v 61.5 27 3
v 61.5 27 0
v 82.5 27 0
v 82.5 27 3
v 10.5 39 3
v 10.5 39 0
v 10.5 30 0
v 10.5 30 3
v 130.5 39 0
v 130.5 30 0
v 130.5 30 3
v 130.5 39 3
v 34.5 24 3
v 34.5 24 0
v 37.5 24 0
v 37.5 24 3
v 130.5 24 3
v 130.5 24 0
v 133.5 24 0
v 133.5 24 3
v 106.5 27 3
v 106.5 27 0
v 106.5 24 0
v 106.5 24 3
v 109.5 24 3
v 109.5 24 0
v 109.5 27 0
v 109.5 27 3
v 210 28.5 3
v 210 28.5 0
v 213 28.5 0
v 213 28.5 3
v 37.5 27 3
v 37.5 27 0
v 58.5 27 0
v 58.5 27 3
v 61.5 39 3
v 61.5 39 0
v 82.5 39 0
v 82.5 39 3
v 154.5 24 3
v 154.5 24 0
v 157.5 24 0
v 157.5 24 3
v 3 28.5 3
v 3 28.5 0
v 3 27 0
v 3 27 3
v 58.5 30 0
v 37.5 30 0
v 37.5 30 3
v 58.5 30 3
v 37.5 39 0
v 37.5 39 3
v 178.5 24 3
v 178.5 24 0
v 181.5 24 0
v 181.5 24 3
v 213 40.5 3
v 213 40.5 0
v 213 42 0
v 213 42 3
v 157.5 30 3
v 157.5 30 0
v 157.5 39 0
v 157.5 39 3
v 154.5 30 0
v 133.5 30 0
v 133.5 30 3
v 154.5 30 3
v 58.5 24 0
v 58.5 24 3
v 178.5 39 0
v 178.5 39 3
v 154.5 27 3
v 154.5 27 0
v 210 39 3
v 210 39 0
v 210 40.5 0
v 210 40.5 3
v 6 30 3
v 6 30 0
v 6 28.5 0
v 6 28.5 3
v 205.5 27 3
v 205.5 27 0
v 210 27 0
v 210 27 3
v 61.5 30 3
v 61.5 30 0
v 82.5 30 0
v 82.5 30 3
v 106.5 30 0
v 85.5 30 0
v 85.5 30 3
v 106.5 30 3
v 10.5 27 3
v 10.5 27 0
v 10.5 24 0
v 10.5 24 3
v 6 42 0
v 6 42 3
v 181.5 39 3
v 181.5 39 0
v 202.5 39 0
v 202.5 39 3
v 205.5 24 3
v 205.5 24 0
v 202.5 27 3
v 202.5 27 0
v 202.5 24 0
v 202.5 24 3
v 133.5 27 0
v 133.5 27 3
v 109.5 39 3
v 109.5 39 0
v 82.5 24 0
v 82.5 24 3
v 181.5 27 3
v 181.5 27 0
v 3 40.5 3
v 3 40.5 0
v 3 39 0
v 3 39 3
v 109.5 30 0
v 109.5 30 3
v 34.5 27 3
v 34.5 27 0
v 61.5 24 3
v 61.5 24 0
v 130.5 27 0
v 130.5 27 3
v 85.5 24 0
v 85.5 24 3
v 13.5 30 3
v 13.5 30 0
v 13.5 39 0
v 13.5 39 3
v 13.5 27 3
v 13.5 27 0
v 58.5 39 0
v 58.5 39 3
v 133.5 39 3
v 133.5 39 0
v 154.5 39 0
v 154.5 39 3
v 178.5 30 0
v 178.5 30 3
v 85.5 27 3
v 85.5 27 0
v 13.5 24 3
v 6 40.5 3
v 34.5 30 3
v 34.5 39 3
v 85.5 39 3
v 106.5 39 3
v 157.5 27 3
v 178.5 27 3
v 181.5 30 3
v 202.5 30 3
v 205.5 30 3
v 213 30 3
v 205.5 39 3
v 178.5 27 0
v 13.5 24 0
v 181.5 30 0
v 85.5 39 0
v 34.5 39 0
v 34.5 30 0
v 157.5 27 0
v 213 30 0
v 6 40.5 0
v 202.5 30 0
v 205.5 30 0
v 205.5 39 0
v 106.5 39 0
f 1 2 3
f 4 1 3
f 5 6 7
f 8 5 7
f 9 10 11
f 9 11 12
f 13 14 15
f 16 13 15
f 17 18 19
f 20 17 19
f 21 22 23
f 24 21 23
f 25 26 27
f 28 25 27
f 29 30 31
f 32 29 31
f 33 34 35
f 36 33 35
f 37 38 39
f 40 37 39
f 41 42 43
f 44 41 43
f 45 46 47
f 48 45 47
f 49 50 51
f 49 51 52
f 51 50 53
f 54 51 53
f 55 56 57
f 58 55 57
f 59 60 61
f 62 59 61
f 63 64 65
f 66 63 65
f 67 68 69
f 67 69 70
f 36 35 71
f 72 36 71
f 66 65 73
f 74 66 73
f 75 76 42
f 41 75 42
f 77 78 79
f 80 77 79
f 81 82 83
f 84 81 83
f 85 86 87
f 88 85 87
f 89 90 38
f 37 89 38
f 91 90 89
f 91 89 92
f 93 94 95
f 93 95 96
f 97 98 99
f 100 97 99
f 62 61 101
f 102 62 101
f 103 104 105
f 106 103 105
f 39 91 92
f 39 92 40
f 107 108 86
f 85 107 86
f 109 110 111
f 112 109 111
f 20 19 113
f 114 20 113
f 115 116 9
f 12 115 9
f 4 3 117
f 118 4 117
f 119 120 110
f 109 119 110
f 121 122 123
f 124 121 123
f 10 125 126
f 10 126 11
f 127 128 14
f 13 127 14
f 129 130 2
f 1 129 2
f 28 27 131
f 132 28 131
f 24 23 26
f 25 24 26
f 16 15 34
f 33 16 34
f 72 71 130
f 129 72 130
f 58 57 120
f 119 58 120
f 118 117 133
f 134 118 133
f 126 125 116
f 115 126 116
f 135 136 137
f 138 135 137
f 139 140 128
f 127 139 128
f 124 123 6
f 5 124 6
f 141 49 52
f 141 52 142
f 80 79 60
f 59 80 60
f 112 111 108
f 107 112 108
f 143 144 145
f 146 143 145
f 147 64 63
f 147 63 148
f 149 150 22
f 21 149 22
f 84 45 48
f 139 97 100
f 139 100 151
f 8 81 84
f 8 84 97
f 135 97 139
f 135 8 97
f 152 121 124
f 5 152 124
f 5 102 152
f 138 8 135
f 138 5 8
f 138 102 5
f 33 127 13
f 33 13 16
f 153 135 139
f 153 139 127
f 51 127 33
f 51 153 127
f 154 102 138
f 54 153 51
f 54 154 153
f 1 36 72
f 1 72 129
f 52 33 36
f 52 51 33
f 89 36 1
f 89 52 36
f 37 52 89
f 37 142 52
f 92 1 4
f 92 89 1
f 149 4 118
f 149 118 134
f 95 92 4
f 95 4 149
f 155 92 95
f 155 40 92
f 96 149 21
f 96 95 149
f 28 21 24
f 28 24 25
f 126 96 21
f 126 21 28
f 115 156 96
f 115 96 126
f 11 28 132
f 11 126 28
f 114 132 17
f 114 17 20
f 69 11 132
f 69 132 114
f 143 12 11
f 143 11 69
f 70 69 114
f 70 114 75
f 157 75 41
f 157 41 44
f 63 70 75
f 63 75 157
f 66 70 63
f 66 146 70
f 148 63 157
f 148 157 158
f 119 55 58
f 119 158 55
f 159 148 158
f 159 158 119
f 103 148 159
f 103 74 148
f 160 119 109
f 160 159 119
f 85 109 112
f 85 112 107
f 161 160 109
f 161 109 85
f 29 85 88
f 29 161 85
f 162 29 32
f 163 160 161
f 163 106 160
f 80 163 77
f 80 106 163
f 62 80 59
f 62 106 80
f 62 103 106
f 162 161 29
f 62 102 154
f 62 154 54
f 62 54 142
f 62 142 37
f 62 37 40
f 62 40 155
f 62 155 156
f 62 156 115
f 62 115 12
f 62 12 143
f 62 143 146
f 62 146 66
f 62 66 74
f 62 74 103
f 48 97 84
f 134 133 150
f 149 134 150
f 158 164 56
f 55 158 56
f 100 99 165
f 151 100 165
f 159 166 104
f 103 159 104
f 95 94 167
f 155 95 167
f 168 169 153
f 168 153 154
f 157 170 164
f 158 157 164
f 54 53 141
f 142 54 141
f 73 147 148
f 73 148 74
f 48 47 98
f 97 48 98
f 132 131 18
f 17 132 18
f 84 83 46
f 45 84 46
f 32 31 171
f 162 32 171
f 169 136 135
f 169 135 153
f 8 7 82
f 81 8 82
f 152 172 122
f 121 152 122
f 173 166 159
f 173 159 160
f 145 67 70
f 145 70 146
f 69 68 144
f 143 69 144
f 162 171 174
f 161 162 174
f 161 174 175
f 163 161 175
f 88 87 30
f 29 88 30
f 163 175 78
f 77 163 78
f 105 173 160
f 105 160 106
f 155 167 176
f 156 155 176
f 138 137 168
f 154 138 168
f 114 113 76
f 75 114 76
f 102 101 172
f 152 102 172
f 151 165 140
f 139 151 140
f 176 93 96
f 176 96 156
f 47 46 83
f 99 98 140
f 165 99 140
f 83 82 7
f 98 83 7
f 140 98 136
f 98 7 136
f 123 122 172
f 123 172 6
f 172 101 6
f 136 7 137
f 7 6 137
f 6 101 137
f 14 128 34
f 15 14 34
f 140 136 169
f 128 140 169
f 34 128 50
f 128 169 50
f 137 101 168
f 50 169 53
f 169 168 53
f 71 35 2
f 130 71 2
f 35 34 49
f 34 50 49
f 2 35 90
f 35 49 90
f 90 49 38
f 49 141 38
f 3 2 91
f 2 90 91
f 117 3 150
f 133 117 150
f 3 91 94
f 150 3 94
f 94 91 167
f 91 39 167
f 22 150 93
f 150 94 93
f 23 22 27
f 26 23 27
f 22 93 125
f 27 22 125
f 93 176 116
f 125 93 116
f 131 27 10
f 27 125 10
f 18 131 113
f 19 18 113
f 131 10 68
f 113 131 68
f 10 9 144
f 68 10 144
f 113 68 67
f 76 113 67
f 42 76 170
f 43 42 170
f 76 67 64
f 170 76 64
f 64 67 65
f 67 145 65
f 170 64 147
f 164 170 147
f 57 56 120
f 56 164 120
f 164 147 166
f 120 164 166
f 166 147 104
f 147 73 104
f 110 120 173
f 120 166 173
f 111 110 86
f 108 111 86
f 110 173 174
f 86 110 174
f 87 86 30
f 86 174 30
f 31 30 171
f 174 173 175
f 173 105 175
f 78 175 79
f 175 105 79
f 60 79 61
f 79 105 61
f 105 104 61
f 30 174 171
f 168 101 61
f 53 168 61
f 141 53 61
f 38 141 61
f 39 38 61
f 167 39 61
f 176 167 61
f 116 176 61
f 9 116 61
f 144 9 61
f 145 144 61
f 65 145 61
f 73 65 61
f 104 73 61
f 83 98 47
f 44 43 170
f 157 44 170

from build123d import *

# Parameters (mm, degrees)
SKETCH1_W           = 21
SKETCH1_H           = 9
BOSS_EXTRUDE1_DEPTH = 3


with BuildPart() as part:
    # Sketch1 → Boss-Extrude1 (new body)
    with BuildSketch(Plane.XY):
        Polygon((178.5, 24), (181.5, 24), (181.5, 27), (202.5, 27), (202.5, 24), (205.5, 24), (205.5, 27), (210, 27), (210, 28.5), (213, 28.5), (213, 30), (205.5, 30), (205.5, 39), (210, 39), (210, 40.5), (213, 40.5), (213, 42), (6, 42), (6, 40.5), (3, 40.5), (3, 39), (10.5, 39), (10.5, 30), (6, 30), (6, 28.5), (3, 28.5), (3, 27), (10.5, 27), (10.5, 24), (13.5, 24), (13.5, 27), (34.5, 27), (34.5, 24), (37.5, 24), (37.5, 27), (58.5, 27), (58.5, 24), (61.5, 24), (61.5, 27), (82.5, 27), (82.5, 24), (85.5, 24), (85.5, 27), (106.5, 27), (106.5, 24), (109.5, 24), (109.5, 27), (130.5, 27), (130.5, 24), (133.5, 24), (133.5, 27), (154.5, 27), (154.5, 24), (157.5, 24), (157.5, 27), (178.5, 27), align=None)
        with Locations((192, 34.5)):
            Rectangle(SKETCH1_W, SKETCH1_H, mode=Mode.SUBTRACT)
        with Locations((168, 34.5)):
            Rectangle(SKETCH1_W, SKETCH1_H, mode=Mode.SUBTRACT)
        with Locations((144, 34.5)):
            Rectangle(SKETCH1_W, SKETCH1_H, mode=Mode.SUBTRACT)
        with Locations((120, 34.5)):
            Rectangle(SKETCH1_W, SKETCH1_H, mode=Mode.SUBTRACT)
        with Locations((96, 34.5)):
            Rectangle(SKETCH1_W, SKETCH1_H, mode=Mode.SUBTRACT)
        with Locations((72, 34.5)):
            Rectangle(SKETCH1_W, SKETCH1_H, mode=Mode.SUBTRACT)
        with Locations((48, 34.5)):
            Rectangle(SKETCH1_W, SKETCH1_H, mode=Mode.SUBTRACT)
        with Locations((24, 34.5)):
            Rectangle(SKETCH1_W, SKETCH1_H, mode=Mode.SUBTRACT)
    extrude(amount=BOSS_EXTRUDE1_DEPTH)


solid = part.part
